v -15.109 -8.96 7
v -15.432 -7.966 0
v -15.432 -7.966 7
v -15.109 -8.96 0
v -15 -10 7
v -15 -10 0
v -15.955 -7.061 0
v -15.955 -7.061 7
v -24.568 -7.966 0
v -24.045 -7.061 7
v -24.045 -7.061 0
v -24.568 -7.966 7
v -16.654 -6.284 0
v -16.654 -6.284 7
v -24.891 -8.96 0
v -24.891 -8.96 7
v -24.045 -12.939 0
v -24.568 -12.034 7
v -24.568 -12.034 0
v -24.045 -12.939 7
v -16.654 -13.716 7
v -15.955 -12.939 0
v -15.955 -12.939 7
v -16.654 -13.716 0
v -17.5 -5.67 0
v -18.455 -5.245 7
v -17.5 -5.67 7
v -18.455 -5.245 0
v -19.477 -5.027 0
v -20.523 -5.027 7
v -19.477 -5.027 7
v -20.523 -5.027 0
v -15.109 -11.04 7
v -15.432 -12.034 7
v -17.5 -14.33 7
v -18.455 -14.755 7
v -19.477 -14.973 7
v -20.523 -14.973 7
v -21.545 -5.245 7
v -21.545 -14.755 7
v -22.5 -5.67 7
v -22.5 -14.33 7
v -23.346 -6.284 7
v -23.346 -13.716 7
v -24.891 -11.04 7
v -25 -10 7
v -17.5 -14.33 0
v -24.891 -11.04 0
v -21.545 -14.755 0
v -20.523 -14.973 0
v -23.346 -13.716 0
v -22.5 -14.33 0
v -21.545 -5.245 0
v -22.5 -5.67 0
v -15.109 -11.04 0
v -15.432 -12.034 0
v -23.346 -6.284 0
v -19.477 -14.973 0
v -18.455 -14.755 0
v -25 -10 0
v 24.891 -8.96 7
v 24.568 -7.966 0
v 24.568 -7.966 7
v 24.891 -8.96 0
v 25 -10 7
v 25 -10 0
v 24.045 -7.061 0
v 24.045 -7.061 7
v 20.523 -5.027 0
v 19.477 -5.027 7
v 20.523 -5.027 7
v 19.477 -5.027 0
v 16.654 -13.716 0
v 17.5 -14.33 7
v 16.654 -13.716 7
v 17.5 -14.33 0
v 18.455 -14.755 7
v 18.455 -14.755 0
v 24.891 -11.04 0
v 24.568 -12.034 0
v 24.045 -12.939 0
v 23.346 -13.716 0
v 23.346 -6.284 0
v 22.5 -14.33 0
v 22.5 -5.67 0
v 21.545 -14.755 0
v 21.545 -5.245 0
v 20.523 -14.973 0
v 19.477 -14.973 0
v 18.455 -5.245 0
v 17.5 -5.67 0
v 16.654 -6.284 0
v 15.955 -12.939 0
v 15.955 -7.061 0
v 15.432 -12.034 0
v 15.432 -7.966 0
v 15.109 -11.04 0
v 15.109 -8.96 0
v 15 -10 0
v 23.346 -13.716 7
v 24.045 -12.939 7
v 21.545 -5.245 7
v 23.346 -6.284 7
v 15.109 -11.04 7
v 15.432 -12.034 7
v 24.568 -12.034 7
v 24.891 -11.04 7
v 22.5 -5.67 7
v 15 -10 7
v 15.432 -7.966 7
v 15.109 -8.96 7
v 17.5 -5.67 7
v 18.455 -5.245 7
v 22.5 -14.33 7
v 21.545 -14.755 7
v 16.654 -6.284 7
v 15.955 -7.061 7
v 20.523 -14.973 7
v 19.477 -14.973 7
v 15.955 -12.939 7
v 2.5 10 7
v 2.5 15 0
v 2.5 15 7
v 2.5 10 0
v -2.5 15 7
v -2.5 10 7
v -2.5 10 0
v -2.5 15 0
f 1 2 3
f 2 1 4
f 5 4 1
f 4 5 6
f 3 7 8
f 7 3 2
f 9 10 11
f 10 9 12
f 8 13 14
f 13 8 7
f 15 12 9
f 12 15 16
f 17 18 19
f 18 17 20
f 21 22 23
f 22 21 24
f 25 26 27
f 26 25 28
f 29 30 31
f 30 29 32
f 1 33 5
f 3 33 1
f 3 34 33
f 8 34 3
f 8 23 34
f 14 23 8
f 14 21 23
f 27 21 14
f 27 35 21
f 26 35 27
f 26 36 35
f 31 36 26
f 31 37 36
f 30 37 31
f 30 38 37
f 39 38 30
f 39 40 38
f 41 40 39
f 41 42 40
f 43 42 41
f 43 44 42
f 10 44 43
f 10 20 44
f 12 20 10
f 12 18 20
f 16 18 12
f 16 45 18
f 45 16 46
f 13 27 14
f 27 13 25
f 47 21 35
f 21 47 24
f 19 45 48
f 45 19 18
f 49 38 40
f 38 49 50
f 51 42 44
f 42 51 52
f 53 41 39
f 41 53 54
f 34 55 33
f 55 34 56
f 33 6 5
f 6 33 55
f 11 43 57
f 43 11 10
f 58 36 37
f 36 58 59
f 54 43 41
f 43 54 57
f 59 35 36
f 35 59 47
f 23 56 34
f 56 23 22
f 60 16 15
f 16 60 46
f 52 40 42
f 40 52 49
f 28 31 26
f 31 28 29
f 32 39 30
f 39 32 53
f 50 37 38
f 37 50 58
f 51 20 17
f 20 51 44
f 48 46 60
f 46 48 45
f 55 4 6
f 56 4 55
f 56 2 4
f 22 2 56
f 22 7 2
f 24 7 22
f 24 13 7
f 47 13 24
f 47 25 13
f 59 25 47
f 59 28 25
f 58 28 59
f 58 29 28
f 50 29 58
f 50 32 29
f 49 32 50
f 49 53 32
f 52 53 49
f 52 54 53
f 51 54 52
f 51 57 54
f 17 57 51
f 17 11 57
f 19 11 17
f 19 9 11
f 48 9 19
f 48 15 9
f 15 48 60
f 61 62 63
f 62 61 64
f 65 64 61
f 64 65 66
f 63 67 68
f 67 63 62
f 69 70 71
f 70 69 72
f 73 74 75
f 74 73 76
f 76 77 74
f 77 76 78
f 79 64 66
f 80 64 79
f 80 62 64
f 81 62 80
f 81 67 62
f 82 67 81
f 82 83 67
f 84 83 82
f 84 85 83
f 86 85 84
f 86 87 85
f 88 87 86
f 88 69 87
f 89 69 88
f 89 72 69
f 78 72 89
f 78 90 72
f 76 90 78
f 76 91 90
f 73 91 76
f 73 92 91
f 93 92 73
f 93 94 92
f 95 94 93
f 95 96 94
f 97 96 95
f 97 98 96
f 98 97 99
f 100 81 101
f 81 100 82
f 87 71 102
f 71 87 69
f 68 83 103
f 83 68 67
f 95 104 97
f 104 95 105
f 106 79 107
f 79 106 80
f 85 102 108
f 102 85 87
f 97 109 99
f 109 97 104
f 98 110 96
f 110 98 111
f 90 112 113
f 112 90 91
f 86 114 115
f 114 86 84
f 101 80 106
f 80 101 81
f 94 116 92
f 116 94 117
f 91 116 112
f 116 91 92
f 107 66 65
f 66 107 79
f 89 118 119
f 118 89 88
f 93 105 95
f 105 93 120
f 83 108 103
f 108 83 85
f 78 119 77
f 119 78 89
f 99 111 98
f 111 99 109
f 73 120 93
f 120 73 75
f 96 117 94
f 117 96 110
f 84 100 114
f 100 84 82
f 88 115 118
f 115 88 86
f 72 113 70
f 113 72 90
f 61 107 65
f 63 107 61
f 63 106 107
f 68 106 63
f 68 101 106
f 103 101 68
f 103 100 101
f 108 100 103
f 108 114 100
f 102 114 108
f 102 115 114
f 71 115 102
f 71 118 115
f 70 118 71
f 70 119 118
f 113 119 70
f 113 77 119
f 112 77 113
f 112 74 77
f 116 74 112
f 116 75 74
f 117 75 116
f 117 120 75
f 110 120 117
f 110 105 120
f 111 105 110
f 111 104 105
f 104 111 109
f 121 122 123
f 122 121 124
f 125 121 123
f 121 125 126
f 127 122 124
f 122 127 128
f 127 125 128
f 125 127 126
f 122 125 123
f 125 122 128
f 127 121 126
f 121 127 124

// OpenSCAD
$fn=30;

bottom_h = 0.2;

pillar_d = 3;


//retractor();
//part1();
//part2();

retract_blob_test();

module part1() {
    translate([-1.5, -1.5, 0])
    cube([38, 21, bottom_h]);

    translate([0,0,bottom_h]) cylinder(d=pillar_d, h=10);
    translate([5,10,bottom_h]) cylinder(d=pillar_d, h=10);
    translate([15,10,bottom_h]) cylinder(d=pillar_d, h=10);
    translate([25,12,bottom_h]) cylinder(d=pillar_d, h=10);
}

module part2() {
    translate([5,18,bottom_h]) cylinder(d=pillar_d, h=10);
    translate([35,10,bottom_h]) cylinder(d=pillar_d, h=10);
    translate([25,0,bottom_h]) cylinder(d=pillar_d, h=10);
    translate([15,1,bottom_h]) cylinder(d=pillar_d, h=10);
}

module retractor() {
    union() {
        part1();
        part2();
    }
}

module retract_blob_test() {
    translate([-20, -10, 0])
    cylinder(d=10, h=7, $fn=30);

    translate([20, -10, 0])
    cylinder(d=10, h=7, $fn=30);

    translate([-5/2, 10])
    cube([5, 5, 7]);
}
